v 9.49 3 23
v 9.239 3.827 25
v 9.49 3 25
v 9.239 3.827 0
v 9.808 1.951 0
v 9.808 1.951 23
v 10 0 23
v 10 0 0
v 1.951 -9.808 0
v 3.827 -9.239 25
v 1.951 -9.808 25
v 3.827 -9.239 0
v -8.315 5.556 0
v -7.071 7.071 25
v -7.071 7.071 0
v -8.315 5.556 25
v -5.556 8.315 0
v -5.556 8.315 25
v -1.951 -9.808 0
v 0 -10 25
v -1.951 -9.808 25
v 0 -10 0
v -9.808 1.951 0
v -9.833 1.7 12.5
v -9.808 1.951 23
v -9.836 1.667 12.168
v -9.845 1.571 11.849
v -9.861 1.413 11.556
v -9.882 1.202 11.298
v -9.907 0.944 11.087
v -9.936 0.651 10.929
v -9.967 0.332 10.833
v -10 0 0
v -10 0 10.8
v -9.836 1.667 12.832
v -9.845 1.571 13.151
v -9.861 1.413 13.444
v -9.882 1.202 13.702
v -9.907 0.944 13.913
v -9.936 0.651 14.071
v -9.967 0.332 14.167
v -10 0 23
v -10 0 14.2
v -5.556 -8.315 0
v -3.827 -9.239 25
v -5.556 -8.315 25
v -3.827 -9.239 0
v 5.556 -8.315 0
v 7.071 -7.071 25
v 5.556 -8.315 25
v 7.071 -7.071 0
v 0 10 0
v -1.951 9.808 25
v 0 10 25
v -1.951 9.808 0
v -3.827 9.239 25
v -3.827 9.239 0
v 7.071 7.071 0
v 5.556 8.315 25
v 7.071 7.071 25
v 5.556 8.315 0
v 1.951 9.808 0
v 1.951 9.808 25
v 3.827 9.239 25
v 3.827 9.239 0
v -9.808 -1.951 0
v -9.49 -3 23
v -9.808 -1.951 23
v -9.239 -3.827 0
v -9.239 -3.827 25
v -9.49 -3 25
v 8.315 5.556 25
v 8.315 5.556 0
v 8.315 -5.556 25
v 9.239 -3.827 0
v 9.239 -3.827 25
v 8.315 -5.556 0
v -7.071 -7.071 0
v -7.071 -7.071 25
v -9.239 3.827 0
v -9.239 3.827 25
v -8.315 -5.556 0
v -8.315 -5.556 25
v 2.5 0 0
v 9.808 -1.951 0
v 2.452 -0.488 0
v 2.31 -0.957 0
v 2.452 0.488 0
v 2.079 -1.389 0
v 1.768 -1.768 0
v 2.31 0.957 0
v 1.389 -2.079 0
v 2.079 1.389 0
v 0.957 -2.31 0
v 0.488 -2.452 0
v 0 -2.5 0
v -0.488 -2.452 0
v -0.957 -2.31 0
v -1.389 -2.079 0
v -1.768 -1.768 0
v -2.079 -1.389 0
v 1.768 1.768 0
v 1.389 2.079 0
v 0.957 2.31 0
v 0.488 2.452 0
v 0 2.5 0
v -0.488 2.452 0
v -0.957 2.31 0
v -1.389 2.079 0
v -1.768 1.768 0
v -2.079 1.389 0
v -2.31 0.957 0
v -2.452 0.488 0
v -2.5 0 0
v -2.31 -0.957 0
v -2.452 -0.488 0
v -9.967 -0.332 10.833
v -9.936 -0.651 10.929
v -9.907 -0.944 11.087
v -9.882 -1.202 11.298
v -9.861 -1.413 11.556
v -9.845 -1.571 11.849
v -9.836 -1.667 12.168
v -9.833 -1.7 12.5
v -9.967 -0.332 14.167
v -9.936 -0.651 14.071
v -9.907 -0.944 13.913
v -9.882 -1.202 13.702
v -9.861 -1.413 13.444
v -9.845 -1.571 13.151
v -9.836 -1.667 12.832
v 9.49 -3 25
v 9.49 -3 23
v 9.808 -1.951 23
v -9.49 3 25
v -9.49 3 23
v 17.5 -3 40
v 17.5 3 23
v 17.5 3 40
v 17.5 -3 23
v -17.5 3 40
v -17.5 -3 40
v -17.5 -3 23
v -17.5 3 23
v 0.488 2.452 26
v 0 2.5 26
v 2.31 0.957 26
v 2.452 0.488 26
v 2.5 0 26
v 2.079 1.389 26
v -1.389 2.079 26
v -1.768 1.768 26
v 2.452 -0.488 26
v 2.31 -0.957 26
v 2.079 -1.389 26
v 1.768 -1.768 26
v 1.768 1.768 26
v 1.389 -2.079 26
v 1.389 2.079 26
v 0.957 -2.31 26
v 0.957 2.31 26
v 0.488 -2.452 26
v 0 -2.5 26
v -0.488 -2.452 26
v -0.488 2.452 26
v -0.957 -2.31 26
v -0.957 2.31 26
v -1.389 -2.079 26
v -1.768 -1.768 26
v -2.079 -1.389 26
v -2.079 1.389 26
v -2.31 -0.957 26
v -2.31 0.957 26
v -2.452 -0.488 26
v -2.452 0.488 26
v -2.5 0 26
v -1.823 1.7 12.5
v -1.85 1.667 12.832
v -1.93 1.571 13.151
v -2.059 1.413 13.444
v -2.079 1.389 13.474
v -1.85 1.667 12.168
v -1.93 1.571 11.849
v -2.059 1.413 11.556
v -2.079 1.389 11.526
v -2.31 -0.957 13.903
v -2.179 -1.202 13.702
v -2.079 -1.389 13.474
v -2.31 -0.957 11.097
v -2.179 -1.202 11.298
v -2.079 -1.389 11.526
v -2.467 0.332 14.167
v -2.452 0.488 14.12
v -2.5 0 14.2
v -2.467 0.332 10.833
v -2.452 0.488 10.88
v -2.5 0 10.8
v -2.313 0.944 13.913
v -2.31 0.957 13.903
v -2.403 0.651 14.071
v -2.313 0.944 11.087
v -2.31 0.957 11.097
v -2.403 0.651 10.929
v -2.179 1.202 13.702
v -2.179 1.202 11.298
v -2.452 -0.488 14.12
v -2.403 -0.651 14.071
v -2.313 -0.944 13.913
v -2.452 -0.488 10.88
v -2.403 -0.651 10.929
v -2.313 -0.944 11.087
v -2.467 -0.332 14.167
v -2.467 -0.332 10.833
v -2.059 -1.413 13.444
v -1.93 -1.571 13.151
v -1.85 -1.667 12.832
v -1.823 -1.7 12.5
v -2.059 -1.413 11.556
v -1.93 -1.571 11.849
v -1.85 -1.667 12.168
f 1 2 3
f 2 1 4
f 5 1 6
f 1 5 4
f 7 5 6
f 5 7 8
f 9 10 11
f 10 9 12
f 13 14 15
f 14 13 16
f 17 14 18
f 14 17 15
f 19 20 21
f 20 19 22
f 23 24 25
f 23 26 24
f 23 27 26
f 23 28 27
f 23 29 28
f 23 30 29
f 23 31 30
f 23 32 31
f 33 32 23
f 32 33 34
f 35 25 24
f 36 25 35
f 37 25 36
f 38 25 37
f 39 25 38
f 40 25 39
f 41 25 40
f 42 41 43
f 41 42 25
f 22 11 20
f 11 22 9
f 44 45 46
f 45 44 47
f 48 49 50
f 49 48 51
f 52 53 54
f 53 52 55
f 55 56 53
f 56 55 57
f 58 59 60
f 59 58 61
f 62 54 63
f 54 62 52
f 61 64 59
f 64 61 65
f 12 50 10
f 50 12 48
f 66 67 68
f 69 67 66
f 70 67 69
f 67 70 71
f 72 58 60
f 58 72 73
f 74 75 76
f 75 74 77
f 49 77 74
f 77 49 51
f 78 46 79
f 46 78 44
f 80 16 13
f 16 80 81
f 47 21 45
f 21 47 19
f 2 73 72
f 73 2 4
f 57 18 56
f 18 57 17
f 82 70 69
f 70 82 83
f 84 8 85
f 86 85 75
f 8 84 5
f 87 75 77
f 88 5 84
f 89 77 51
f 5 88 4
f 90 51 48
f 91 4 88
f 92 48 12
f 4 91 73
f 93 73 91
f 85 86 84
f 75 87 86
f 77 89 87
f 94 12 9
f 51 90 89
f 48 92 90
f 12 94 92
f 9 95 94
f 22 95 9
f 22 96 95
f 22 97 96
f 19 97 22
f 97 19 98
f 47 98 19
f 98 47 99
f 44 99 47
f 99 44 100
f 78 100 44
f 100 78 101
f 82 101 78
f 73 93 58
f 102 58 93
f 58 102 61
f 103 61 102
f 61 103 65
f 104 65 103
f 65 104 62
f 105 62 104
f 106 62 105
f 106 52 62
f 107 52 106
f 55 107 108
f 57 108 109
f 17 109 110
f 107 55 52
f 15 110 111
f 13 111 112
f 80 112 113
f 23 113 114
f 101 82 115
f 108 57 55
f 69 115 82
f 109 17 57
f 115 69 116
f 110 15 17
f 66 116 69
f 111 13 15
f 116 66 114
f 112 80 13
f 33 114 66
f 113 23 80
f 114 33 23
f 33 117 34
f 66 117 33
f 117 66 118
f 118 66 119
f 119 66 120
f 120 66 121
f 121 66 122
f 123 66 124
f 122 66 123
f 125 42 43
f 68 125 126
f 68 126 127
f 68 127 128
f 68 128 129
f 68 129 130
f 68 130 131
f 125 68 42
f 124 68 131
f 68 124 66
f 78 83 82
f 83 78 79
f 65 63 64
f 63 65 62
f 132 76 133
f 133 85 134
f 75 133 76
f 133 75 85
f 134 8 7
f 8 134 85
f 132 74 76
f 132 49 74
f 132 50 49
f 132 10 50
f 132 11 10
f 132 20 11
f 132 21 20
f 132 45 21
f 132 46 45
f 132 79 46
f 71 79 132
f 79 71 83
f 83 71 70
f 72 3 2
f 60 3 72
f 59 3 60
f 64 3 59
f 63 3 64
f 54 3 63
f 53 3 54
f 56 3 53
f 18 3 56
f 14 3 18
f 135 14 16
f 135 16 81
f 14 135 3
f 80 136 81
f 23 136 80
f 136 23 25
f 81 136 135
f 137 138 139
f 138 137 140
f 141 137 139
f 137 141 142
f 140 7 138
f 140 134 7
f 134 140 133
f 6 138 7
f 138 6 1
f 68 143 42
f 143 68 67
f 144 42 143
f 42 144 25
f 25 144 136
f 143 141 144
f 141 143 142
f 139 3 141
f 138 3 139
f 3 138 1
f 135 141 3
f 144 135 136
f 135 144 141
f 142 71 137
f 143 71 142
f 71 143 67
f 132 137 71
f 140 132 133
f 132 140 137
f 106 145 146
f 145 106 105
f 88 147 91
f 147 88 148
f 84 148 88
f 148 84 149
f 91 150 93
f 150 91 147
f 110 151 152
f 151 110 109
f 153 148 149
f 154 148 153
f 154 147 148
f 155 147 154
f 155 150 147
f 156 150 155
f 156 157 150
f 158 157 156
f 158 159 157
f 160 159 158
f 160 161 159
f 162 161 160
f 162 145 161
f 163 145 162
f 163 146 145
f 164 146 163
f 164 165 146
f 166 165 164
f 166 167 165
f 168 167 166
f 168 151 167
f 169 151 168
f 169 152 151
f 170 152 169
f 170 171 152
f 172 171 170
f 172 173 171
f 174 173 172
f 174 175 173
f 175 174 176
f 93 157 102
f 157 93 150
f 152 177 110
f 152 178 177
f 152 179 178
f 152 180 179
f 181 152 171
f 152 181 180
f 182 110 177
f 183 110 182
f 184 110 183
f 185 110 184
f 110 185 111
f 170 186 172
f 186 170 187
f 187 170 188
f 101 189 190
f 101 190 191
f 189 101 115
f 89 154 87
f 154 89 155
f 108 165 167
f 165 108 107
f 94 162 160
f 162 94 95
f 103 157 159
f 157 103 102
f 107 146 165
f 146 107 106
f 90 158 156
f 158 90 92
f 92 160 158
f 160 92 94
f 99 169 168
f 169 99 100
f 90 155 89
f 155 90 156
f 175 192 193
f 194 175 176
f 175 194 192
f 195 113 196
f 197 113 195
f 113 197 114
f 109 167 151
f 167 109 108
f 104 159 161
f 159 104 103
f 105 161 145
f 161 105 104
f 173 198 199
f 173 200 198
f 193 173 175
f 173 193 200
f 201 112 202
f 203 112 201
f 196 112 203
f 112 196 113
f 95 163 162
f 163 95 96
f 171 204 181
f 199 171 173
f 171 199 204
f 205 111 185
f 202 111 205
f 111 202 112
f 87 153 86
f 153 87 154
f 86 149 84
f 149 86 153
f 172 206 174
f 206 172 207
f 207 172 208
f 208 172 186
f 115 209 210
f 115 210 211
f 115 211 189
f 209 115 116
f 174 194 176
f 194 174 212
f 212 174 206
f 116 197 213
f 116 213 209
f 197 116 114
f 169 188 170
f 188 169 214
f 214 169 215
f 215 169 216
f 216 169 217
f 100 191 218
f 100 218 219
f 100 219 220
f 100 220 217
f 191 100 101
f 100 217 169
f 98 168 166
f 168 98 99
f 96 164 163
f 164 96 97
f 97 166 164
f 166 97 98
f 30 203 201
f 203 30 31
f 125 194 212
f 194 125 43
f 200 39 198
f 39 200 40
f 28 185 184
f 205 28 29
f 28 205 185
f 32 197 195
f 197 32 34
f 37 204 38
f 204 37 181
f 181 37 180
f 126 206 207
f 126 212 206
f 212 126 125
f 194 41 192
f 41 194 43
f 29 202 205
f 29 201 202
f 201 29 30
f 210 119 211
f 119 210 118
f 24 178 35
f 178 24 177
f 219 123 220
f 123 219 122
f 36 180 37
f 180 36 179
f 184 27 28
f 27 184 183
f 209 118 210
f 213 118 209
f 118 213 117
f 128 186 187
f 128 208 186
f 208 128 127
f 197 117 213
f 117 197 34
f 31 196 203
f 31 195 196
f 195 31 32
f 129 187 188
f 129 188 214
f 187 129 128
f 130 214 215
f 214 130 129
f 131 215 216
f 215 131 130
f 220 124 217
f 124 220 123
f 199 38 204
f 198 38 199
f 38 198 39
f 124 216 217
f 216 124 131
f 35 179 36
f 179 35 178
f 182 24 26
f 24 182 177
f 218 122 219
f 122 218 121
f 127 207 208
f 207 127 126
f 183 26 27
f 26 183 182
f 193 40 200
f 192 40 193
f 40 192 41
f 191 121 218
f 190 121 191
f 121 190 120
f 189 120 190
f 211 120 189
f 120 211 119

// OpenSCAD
$fn = 32;

// ----------------------------------------------------------------------
// Hand knob: 20 x 35 x 25 mm
// ----------------------------------------------------------------------

// --- parameters (mm) ---
head_d = 20;              // knob diameter
head_h = 25;              // knob height
hole_d = 5;               // shaft bore
set_d = 3.4;              // set screw tap hole
wing_l = 35;              // wing span
wing_w = 6;               // wing width
wing_h = 15;              // wing thickness

module body() {
  cylinder(h = head_h, d = head_d);
}

module wing() {
  /* wing sunk 2 mm into the knob so the joint overlaps */
  translate([-wing_l / 2, -wing_w / 2, head_h - 2])
    cube([wing_l, wing_w, wing_h + 2]);
}

difference() {
  union() {
    body();
    wing();
  }
  translate([0, 0, -1]) cylinder(h = head_h + 0 + 2, d = hole_d);
  translate([-head_d / 2 - 1, 0, head_h * 0.5]) rotate([0, 90, 0]) cylinder(h = head_d / 2 + 2, d = set_d);
}
